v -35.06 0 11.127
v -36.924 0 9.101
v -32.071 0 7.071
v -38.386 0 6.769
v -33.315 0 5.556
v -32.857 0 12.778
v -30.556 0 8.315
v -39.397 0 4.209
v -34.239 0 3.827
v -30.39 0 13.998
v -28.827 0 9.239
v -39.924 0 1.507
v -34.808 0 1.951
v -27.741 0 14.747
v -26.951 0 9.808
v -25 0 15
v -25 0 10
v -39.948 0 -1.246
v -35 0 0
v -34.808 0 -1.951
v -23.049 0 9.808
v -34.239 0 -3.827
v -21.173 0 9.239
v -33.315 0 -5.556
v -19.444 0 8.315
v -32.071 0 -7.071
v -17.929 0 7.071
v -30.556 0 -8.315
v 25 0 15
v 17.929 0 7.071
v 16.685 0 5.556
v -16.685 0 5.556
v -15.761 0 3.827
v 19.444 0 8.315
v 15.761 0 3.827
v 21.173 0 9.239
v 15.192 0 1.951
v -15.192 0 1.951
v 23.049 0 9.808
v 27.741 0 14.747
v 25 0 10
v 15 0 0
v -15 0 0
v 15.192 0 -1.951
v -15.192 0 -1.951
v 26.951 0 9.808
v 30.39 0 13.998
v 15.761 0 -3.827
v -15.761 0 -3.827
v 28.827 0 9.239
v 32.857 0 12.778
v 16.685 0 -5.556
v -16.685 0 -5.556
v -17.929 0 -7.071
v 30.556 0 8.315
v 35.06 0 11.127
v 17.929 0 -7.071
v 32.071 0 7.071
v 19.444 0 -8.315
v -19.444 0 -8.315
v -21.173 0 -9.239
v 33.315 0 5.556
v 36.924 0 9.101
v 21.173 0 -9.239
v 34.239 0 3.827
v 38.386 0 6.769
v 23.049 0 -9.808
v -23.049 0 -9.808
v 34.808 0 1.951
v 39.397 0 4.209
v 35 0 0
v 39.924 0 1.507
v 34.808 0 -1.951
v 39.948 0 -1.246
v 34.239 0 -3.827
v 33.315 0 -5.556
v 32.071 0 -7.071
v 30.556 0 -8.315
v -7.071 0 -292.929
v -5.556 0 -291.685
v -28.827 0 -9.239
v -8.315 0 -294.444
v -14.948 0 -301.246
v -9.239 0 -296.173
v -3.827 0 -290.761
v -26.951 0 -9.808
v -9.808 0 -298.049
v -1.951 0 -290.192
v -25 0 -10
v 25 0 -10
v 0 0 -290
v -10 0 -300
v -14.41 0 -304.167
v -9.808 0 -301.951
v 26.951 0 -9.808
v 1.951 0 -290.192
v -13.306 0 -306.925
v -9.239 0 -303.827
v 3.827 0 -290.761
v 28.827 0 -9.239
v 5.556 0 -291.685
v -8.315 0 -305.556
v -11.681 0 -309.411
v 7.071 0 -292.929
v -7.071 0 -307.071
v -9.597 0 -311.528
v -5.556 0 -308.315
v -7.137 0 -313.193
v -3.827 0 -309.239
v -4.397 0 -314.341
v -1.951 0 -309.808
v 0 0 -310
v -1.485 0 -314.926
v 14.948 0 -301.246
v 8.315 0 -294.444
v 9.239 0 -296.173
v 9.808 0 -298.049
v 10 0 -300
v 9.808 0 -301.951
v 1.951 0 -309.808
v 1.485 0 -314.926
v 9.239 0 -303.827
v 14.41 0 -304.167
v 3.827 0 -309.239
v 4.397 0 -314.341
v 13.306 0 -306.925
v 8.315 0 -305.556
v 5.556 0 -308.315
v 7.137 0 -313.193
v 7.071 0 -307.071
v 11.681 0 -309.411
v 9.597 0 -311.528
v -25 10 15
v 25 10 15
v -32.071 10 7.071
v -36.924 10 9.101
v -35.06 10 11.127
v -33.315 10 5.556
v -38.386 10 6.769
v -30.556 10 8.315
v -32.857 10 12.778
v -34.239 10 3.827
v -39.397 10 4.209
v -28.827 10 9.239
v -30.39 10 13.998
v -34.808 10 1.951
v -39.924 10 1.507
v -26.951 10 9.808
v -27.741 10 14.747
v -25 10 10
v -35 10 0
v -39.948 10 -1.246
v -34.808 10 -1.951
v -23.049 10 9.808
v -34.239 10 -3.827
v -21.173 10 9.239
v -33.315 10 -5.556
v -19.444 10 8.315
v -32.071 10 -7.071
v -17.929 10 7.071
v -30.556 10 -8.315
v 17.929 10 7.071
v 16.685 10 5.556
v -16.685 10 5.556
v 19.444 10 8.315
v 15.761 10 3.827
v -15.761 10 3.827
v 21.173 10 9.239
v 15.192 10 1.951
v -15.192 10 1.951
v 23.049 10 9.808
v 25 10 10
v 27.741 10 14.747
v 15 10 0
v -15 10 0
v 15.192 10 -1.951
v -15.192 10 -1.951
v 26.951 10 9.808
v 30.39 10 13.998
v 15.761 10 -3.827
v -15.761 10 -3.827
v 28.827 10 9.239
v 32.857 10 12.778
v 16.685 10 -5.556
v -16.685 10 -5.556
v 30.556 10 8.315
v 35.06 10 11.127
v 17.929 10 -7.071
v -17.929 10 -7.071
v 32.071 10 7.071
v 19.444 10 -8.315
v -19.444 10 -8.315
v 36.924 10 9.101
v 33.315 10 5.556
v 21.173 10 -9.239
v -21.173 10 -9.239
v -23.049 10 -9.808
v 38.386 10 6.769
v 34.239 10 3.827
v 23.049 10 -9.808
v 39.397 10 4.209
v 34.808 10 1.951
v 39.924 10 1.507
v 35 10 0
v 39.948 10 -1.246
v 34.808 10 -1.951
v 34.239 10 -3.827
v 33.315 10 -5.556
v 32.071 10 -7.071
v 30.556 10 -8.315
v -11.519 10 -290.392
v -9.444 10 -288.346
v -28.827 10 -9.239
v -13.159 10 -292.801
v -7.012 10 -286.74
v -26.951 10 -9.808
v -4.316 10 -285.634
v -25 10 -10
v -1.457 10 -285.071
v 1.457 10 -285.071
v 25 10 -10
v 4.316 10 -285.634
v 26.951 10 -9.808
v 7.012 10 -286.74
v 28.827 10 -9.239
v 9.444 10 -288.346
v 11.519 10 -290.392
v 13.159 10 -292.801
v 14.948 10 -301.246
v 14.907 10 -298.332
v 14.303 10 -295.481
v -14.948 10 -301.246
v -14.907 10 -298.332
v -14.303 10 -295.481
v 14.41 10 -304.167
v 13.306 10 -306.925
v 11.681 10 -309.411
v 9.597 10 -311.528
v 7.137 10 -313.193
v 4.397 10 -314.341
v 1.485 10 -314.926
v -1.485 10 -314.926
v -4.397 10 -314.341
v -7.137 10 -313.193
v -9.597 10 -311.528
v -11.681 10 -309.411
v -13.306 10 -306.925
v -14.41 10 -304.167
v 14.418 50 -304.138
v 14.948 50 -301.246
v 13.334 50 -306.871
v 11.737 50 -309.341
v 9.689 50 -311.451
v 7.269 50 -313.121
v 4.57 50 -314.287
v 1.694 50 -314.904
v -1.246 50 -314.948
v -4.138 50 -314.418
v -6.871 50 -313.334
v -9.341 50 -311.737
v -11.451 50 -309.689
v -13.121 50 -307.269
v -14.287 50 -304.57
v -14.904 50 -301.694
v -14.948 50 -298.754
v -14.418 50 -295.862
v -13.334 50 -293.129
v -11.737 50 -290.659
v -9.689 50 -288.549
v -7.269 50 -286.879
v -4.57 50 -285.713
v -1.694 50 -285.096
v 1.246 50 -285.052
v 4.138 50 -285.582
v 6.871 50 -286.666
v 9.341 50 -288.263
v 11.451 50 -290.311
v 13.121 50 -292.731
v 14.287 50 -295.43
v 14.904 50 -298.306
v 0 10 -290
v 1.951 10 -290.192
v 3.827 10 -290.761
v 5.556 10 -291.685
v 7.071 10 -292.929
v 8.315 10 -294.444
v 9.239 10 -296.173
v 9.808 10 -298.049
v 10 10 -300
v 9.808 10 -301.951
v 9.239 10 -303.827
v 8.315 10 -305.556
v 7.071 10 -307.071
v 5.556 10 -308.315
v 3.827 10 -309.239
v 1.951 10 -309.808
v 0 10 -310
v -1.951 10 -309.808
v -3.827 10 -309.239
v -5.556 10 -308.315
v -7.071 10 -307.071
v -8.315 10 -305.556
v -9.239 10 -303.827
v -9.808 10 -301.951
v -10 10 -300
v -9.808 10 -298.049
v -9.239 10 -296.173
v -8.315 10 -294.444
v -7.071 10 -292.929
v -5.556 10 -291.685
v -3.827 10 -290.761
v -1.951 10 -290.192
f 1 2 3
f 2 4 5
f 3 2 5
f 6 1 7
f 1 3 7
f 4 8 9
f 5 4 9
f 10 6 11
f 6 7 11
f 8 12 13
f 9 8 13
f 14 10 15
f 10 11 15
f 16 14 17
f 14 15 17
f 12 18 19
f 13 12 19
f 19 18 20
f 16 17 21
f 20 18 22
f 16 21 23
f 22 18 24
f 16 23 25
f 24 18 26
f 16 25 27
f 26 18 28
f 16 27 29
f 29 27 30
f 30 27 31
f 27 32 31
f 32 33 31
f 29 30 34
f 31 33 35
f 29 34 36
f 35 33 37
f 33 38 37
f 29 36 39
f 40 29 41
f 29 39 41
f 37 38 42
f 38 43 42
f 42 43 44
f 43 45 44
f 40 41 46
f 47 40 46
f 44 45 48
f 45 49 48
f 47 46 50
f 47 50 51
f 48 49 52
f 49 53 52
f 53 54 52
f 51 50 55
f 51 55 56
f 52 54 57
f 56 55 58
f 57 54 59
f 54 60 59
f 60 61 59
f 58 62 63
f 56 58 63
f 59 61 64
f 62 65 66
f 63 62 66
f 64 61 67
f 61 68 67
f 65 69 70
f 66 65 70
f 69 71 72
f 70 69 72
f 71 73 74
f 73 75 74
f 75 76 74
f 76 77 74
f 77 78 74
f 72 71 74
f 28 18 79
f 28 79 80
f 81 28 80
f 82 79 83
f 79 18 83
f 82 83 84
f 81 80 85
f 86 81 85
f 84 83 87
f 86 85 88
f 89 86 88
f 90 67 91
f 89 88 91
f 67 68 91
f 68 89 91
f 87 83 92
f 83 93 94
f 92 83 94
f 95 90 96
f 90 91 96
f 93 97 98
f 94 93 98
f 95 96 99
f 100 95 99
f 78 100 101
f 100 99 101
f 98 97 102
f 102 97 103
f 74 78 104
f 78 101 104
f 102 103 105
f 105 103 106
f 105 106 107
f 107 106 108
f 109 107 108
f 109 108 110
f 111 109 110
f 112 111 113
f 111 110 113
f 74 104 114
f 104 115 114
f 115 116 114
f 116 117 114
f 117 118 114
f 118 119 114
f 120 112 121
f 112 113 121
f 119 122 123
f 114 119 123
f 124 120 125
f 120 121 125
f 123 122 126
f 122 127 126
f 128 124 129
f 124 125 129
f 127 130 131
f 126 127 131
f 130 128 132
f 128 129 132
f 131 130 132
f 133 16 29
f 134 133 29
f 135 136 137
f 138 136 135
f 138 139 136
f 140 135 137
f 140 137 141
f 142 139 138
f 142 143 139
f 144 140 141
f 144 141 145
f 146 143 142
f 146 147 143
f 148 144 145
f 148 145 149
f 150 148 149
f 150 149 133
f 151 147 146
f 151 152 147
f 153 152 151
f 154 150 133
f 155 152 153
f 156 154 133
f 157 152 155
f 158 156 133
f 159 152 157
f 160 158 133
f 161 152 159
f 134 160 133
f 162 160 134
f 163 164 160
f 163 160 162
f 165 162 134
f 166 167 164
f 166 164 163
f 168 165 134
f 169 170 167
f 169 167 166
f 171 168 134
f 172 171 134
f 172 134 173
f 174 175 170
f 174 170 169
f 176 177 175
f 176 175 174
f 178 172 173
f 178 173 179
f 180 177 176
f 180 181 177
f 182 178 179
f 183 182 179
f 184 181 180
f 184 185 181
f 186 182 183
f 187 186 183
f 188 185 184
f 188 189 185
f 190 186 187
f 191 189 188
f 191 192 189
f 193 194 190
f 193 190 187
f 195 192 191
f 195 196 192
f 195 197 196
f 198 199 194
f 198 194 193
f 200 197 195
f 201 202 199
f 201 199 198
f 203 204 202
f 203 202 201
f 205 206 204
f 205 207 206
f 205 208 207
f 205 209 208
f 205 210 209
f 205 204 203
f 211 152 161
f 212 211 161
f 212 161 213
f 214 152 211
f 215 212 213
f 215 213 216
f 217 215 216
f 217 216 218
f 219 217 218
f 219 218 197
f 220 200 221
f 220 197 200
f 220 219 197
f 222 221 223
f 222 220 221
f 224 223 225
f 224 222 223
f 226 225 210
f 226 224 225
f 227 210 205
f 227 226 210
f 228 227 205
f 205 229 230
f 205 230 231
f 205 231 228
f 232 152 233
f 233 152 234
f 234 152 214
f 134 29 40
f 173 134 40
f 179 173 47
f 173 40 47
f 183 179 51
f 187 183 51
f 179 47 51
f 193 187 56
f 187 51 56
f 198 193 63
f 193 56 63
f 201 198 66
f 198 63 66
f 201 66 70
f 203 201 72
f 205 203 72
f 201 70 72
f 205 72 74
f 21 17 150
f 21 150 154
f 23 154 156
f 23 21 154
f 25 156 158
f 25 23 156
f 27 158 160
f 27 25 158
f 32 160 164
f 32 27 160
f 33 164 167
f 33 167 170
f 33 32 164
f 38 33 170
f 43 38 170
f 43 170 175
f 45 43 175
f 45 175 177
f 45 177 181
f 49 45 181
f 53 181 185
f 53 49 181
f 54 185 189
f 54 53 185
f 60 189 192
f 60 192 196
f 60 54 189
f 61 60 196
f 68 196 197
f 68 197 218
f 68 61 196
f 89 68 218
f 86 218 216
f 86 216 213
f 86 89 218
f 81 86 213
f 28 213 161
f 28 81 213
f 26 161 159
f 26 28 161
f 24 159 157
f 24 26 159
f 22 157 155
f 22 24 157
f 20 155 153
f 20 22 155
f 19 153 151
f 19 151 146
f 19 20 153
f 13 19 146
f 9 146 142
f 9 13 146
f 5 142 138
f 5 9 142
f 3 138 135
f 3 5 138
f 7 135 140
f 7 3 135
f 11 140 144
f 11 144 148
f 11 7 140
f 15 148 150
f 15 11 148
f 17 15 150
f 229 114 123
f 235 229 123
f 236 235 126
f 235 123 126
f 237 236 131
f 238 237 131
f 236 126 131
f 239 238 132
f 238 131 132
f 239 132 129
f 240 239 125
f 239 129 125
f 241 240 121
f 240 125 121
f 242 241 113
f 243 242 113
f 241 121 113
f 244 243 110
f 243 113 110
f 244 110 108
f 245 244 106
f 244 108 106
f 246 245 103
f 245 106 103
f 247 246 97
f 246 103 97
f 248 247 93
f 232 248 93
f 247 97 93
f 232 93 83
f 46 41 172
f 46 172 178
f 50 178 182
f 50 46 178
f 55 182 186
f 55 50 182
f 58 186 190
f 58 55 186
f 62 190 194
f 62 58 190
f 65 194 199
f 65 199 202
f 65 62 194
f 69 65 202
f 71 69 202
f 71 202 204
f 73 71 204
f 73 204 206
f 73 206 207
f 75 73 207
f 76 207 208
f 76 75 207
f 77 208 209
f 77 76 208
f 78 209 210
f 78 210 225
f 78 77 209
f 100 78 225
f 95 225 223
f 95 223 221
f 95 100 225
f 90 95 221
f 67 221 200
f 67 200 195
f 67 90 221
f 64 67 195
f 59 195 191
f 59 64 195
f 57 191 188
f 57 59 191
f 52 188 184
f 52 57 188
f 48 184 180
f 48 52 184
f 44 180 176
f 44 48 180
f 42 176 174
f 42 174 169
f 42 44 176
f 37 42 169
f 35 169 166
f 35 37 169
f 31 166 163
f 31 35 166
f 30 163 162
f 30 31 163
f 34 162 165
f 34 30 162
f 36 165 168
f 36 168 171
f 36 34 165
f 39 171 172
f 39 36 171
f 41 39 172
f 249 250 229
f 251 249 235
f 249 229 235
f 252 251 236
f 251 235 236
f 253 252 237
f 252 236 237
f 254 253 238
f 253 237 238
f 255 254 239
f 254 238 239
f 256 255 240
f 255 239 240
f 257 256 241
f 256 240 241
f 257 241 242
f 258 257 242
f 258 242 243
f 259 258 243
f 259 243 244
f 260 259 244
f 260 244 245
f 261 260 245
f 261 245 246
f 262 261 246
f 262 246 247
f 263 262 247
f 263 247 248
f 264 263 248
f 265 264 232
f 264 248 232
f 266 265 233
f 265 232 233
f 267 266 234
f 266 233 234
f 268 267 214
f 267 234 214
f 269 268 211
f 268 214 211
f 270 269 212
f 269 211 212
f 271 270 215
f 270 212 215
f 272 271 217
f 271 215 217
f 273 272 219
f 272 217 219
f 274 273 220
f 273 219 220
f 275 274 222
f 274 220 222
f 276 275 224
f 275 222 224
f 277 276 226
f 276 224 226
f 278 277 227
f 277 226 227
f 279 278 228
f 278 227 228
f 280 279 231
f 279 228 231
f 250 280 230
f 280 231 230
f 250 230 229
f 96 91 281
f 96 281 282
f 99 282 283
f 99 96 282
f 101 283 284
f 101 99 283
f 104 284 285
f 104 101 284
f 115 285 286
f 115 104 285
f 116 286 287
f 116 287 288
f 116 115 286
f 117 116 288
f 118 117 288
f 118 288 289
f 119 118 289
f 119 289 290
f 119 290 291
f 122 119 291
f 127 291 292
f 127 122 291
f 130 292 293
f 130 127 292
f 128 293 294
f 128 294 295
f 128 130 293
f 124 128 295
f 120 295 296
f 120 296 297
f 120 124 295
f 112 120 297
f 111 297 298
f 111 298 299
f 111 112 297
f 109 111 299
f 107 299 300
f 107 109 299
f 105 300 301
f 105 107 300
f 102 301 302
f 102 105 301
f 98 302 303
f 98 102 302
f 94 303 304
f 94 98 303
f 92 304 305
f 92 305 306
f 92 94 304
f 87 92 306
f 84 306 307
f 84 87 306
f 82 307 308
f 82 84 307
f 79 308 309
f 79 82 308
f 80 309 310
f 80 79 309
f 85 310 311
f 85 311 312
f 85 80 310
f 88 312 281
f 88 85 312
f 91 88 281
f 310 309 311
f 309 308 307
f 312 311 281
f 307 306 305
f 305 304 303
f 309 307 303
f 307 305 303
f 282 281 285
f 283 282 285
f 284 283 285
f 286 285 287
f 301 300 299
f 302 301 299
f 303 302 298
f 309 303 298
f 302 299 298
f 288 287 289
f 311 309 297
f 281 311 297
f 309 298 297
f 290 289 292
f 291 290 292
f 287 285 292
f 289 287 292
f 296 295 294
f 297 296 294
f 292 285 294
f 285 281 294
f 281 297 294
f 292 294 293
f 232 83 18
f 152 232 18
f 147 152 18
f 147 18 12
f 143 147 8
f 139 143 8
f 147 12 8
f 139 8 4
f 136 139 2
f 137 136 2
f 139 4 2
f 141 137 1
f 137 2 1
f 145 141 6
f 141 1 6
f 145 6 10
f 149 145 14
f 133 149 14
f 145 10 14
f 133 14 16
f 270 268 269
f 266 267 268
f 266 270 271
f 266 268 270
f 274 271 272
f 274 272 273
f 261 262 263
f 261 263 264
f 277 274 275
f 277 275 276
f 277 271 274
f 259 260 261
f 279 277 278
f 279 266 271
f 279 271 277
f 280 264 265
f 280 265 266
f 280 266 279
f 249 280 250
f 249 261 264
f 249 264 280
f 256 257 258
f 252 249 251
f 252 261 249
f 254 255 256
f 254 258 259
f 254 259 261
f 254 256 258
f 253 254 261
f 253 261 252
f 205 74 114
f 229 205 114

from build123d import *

# Parameters (mm, degrees)
SKETCH_1_R      = 15
SKETCH_1_R_2    = 10
EXTRUDE_1_DEPTH = 10
SKETCH_2_R      = 15
EXTRUDE_2_DEPTH = 40


with BuildPart() as part:
    # 草圖1 → 填料-伸長1 (new body)
    # profile 1 of 4: a face of its own
    with BuildSketch(Plane(origin=(0, 0, 0), x_dir=(1, 0, 0), z_dir=(0, 1, 0))):
        with BuildLine():
            ThreePointArc((-10, 0), (-14.393398282, -10.606601718), (-25, -15))
            Line((-25, -15), (25, -15))
            ThreePointArc((25, -15), (13.961765699, 10.156642335), (39.948186374, 1.245682198))
            Line((39.948186374, 1.245682198), (14.948186374, 301.245682198))
            ThreePointArc((14.948186374, 301.245682198), (14.987040996, 300.623379658), (15, 300))
            ThreePointArc((15, 300), (-0.623379658, 285.012959004), (-14.948186374, 301.245682198))
            Line((-14.948186374, 301.245682198), (-39.948186374, 1.245682198))
            ThreePointArc((-39.948186374, 1.245682198), (-24.376620342, 14.987040996), (-10, 0))
        make_face()
    # profile 2 of 4: a face of its own
    with BuildSketch(Plane(origin=(0, 0, 0), x_dir=(1, 0, 0), z_dir=(0, 1, 0))):
        with Locations((-25, 0)):
            Circle(SKETCH_1_R)
        with Locations(Location((-25, 0, 0), (0, 0, 270))):
            Circle(SKETCH_1_R_2, mode=Mode.SUBTRACT)
    # profile 3 of 4: a face of its own
    with BuildSketch(Plane(origin=(0, 0, 0), x_dir=(1, 0, 0), z_dir=(0, 1, 0))):
        with Locations((25, 0)):
            Circle(SKETCH_1_R)
        with Locations(Location((25, 0, 0), (0, 0, 270))):
            Circle(SKETCH_1_R_2, mode=Mode.SUBTRACT)
    # profile 4 of 4: a face of its own
    with BuildSketch(Plane(origin=(0, 0, 0), x_dir=(1, 0, 0), z_dir=(0, 1, 0))):
        with Locations((0, 300)):
            Circle(SKETCH_1_R)
        with Locations(Location((0, 300, 0), (0, 0, 270))):
            Circle(SKETCH_1_R_2, mode=Mode.SUBTRACT)
    extrude(amount=EXTRUDE_1_DEPTH)

    # 草圖2 → 填料-伸長2 (add)
    with BuildSketch(Plane(origin=(0, 10, 0), x_dir=(1, 0, 0), z_dir=(0, 1, 0))):
        with Locations(Location((0, 300, 0), (0, 0, 4.763641691))):
            Circle(SKETCH_2_R)
    extrude(amount=EXTRUDE_2_DEPTH)


solid = part.part
